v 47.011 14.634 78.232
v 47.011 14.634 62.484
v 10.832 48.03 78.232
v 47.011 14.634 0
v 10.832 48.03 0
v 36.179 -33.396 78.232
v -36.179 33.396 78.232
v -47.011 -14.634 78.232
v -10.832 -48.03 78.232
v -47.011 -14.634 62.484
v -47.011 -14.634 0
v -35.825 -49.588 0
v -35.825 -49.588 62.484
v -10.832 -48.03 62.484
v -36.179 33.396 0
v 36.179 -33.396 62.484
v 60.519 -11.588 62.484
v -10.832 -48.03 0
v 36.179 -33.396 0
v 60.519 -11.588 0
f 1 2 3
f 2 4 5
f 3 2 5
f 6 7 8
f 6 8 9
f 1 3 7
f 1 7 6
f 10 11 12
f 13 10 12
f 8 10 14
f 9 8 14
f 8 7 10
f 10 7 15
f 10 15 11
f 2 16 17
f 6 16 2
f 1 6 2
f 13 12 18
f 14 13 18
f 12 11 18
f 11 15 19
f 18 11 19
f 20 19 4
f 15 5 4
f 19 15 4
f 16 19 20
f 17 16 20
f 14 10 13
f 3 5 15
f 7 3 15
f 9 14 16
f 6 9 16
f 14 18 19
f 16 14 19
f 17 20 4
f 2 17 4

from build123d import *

# Parameters (mm, degrees)
F1_DEPTH = 78.232
F2_DEPTH = 62.484
F3_DEPTH = 62.484


with BuildPart() as f1:
    # F0 (on Top) → F1 (new body)
    with BuildSketch(Plane.XY):
        Polygon((-36.178753, 33.396009), (-47.011169, -14.633714), (-10.832416, -48.029724), (36.178753, -33.396009), (47.011169, 14.633714), (10.832416, 48.029724), align=None)
    extrude(amount=F1_DEPTH)

    # F0 (on Top) → F2 (join)
    with BuildSketch(Plane.XY):
        Polygon((-10.832416, -48.029724), (-47.011169, -14.633714), (-35.825498, -49.588244), align=None)
    extrude(amount=F2_DEPTH)

    # F0 (on Top) → F3 (join)
    with BuildSketch(Plane.XY):
        Polygon((47.011169, 14.633714), (36.178753, -33.396009), (60.519096, -11.588277), align=None)
    extrude(amount=F3_DEPTH)


solid = f1.part
